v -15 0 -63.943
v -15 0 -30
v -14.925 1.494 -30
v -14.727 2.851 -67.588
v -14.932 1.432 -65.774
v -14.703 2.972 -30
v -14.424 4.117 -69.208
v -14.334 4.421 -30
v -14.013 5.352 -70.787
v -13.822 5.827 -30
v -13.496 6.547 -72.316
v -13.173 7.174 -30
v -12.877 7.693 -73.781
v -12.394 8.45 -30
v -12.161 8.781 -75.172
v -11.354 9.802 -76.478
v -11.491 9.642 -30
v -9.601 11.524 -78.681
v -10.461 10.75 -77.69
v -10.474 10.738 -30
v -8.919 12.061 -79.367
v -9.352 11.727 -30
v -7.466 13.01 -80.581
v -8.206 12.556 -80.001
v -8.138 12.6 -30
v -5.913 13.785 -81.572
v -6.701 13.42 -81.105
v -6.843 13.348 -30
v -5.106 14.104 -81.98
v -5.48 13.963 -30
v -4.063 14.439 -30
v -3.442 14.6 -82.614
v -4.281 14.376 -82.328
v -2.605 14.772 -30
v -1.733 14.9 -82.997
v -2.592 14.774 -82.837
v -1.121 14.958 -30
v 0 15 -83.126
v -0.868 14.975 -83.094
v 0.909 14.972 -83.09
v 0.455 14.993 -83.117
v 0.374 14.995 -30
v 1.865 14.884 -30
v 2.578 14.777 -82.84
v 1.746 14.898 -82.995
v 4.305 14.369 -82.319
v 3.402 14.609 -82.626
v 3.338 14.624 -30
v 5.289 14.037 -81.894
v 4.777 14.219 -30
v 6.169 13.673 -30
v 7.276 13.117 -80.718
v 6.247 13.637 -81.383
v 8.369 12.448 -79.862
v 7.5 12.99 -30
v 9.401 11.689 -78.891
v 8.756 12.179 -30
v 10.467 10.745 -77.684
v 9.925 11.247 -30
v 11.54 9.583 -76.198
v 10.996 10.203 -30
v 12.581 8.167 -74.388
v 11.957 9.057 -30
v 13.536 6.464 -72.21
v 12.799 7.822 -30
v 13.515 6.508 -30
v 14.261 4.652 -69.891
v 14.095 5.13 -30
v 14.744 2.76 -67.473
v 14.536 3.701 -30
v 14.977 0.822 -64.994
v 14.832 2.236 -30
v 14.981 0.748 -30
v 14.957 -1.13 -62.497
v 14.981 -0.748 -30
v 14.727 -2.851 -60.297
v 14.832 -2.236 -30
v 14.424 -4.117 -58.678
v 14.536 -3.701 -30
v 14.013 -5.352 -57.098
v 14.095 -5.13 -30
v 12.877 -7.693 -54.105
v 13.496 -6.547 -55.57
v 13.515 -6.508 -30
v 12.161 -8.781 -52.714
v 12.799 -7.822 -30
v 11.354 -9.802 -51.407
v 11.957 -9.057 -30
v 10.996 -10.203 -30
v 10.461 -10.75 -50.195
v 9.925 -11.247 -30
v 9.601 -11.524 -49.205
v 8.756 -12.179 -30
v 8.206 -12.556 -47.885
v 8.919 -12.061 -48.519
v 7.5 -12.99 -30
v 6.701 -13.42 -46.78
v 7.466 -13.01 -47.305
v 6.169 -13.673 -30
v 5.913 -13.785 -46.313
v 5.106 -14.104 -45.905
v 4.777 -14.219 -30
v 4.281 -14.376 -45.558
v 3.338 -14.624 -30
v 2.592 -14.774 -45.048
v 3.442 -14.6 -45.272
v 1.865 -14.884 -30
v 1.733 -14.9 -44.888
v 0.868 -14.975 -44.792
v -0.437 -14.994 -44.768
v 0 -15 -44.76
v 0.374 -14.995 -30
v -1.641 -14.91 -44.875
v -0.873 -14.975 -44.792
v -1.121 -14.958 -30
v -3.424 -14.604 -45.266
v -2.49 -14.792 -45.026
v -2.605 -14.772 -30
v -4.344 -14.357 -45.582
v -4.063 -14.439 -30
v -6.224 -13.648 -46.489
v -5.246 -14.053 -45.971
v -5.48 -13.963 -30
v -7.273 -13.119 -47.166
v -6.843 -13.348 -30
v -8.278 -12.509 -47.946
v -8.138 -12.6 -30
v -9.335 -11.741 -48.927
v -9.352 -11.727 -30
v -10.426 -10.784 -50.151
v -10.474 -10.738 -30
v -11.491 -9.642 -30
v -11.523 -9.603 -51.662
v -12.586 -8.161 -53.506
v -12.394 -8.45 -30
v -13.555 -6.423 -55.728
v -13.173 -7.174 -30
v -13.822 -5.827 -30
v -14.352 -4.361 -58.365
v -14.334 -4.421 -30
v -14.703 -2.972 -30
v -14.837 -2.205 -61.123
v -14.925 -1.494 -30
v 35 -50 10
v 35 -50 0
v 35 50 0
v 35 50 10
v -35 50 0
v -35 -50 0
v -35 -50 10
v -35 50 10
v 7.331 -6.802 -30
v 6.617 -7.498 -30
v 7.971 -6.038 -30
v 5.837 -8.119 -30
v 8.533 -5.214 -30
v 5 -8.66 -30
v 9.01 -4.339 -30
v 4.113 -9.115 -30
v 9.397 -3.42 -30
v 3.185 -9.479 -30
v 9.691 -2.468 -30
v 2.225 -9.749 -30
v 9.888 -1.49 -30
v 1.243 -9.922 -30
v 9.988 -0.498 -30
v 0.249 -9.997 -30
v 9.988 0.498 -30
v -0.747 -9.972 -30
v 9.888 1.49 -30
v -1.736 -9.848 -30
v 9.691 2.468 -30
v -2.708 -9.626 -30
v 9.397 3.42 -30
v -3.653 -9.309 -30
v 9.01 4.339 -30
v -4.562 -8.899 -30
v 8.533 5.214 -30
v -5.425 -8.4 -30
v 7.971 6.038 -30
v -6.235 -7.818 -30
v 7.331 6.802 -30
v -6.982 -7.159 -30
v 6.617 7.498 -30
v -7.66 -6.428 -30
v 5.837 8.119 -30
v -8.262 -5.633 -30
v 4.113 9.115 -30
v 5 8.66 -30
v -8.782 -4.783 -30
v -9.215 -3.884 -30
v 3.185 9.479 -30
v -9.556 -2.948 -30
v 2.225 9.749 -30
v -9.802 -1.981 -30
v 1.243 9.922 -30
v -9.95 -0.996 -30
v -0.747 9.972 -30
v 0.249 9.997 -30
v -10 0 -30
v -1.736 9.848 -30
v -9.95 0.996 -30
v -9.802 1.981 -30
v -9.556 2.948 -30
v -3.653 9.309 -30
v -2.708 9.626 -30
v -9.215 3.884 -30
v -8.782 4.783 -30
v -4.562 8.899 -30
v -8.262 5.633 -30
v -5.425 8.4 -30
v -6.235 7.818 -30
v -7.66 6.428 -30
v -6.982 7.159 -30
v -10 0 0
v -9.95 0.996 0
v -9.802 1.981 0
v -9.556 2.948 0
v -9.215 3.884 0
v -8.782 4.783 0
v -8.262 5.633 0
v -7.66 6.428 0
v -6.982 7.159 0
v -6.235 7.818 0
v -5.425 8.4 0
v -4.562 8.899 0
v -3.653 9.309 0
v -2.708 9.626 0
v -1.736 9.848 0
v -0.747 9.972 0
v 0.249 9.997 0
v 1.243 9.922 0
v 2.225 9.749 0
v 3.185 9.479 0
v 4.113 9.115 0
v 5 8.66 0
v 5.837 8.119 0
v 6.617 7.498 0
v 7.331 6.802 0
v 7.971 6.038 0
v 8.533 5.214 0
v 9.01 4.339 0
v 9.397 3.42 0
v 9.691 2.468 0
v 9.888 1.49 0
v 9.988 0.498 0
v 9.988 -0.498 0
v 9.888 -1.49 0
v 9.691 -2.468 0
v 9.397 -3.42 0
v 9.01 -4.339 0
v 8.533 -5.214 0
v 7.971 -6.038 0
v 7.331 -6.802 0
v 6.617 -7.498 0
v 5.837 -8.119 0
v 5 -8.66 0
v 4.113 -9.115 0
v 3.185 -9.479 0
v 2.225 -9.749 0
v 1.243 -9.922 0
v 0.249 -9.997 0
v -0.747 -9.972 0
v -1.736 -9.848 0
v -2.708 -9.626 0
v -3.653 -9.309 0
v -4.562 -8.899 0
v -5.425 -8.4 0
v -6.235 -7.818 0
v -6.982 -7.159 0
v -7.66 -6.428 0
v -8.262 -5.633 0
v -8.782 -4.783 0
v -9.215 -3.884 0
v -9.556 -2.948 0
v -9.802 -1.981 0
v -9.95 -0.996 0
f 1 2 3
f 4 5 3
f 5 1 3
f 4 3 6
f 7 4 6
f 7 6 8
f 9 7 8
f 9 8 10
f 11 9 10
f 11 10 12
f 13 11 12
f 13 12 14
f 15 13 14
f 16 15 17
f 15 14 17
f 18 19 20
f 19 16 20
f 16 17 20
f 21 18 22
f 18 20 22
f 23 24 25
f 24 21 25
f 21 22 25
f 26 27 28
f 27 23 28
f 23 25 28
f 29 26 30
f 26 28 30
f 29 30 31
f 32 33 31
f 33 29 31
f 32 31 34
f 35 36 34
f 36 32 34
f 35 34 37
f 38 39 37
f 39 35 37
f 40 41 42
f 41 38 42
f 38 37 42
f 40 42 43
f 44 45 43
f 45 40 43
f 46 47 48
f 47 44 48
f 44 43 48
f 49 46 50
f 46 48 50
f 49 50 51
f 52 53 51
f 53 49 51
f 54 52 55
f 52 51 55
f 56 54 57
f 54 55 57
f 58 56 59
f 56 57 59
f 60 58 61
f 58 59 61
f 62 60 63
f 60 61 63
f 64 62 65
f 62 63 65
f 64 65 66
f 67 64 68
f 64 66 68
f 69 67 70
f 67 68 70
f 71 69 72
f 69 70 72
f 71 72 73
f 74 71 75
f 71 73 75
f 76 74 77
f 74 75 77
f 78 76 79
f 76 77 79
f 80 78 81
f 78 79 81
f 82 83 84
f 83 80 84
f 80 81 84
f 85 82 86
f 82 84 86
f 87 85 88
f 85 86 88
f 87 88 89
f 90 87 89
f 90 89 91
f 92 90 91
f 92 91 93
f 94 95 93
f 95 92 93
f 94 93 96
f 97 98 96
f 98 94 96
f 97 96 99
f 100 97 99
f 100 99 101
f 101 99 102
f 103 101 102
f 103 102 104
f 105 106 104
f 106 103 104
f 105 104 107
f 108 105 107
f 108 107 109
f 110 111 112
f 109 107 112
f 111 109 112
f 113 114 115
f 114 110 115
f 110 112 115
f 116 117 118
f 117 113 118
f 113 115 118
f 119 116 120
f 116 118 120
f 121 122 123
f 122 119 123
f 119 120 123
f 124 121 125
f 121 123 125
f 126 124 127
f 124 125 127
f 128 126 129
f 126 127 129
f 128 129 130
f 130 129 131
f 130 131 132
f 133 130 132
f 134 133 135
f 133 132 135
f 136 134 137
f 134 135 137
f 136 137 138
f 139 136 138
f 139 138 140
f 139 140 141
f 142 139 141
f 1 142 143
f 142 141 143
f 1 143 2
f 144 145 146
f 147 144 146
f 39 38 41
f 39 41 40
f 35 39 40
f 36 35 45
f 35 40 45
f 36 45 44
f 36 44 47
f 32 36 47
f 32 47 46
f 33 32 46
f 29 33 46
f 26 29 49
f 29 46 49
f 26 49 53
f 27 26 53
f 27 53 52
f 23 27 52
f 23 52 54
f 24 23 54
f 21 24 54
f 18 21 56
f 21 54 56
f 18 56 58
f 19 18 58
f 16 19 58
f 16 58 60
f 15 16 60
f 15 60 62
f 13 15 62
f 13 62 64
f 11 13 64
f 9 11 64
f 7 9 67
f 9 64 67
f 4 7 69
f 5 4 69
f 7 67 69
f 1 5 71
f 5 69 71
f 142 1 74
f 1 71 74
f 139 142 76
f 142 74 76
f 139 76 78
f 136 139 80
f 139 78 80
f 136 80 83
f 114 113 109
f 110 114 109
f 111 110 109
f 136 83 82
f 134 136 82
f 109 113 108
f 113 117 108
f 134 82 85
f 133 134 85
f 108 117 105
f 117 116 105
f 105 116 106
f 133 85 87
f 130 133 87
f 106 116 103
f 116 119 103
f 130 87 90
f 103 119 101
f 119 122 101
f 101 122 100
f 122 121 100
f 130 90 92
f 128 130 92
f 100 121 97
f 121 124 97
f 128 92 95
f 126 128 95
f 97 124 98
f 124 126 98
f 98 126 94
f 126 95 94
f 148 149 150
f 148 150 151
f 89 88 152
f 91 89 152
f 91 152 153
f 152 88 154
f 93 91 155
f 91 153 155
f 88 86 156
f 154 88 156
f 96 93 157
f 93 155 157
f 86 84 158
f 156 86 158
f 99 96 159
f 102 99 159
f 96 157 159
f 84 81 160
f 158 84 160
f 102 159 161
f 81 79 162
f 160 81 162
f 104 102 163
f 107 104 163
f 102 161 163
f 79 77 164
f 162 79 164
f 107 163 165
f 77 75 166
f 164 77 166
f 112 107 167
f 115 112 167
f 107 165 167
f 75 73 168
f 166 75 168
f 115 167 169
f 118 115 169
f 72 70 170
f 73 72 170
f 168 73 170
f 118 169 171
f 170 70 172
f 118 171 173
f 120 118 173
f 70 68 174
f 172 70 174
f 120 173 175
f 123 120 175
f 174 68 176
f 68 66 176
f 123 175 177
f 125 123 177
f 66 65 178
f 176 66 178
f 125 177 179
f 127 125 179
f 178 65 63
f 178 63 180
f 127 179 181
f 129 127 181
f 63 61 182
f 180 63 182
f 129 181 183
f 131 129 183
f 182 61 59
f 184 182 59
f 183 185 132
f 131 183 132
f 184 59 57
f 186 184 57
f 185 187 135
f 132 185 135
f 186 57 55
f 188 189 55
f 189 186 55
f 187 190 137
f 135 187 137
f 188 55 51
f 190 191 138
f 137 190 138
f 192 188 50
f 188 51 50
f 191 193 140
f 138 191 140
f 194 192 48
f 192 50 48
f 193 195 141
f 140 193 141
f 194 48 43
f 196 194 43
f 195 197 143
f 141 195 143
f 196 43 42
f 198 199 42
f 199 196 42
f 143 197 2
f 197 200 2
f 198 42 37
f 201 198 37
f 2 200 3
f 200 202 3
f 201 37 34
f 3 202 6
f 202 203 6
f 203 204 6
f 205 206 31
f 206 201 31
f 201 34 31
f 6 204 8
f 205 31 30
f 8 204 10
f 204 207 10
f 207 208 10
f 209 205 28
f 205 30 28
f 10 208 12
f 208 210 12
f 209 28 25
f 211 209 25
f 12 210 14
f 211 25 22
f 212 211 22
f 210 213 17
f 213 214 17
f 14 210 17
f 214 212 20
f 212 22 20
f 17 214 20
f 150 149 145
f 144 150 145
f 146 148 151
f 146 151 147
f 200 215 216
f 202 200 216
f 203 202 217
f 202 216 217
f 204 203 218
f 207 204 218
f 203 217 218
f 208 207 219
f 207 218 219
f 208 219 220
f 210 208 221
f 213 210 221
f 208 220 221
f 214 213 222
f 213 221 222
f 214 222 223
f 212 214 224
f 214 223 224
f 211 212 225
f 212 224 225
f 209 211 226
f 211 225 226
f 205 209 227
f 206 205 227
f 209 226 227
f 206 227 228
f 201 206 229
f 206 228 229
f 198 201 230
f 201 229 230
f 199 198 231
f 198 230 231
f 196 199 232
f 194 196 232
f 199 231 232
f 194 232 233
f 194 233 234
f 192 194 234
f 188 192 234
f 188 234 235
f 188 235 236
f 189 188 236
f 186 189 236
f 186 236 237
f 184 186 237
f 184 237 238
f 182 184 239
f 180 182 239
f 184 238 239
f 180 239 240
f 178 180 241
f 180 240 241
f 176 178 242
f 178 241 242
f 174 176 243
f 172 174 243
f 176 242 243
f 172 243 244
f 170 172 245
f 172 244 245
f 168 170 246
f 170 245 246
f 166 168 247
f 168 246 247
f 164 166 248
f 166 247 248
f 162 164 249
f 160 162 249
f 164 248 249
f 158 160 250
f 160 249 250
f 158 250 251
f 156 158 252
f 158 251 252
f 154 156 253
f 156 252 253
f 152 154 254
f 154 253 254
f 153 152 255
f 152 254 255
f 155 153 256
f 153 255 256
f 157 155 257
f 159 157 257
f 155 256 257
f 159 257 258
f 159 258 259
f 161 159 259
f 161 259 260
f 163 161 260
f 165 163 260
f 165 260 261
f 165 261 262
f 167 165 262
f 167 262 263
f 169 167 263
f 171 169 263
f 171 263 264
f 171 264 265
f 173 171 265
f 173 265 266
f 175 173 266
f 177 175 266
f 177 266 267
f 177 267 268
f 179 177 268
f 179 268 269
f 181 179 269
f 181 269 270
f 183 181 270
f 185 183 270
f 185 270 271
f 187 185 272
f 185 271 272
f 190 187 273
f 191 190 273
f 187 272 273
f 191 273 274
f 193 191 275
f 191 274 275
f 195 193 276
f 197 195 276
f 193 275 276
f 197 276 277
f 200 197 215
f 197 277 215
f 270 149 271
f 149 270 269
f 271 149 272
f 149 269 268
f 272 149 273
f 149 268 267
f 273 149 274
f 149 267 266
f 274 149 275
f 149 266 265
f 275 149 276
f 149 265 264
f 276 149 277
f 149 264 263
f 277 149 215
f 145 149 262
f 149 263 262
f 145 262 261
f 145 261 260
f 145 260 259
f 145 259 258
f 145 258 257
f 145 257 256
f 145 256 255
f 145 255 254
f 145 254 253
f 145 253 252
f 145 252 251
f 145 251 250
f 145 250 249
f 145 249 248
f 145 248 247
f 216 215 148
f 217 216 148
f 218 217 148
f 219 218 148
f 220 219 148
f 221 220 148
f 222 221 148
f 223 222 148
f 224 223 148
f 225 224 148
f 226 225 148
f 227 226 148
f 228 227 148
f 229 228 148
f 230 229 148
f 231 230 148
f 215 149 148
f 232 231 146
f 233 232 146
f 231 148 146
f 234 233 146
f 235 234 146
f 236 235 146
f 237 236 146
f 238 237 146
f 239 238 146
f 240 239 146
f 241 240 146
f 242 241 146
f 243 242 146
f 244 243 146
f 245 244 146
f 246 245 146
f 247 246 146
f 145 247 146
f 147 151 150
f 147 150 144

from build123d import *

# Parameters (mm, degrees)
SZKIC1_W                    = 70
SZKIC1_H                    = 100
DODANIE_WYCI_GNI_CIE1_DEPTH = 10
SZKIC2_R                    = 10
DODANIE_WYCI_GNI_CIE2_DEPTH = 30
SZKIC3_R                    = 15
DODANIE_WYCI_GNI_CIE3_DEPTH = 60
WYTNIJ_WYCI_GNI_CIE1_DEPTH  = 30


with BuildPart() as part:
    # Szkic1 → Dodanie-wyciągnięcie1 (new body)
    with BuildSketch(Plane.XY):
        Rectangle(SZKIC1_W, SZKIC1_H)
    extrude(amount=DODANIE_WYCI_GNI_CIE1_DEPTH)

    # Szkic2 → Dodanie-wyciągnięcie2 (add)
    with BuildSketch(Plane(origin=(0, 0, 0), x_dir=(-1, 0, 0), z_dir=(0, 0, -1))):
        Circle(SZKIC2_R)
    extrude(amount=DODANIE_WYCI_GNI_CIE2_DEPTH)

    # Szkic3 → Dodanie-wyciągnięcie3 (add)
    with BuildSketch(Plane(origin=(0, 0, -30), x_dir=(-1, 0, 0), z_dir=(0, 0, -1))):
        Circle(SZKIC3_R)
    extrude(amount=DODANIE_WYCI_GNI_CIE3_DEPTH)

    # Szkic4 → Wytnij-wyciągnięcie1 (cut, symmetric)
    with BuildSketch(Plane(origin=(0, 0, 0), x_dir=(0, 0, -1), z_dir=(1, 0, 0))):
        Polygon((83.125666523, 15), (44.759974282, -15), (90, -15), (90, 15), align=None)
    extrude(amount=WYTNIJ_WYCI_GNI_CIE1_DEPTH, both=True, mode=Mode.SUBTRACT)


solid = part.part
